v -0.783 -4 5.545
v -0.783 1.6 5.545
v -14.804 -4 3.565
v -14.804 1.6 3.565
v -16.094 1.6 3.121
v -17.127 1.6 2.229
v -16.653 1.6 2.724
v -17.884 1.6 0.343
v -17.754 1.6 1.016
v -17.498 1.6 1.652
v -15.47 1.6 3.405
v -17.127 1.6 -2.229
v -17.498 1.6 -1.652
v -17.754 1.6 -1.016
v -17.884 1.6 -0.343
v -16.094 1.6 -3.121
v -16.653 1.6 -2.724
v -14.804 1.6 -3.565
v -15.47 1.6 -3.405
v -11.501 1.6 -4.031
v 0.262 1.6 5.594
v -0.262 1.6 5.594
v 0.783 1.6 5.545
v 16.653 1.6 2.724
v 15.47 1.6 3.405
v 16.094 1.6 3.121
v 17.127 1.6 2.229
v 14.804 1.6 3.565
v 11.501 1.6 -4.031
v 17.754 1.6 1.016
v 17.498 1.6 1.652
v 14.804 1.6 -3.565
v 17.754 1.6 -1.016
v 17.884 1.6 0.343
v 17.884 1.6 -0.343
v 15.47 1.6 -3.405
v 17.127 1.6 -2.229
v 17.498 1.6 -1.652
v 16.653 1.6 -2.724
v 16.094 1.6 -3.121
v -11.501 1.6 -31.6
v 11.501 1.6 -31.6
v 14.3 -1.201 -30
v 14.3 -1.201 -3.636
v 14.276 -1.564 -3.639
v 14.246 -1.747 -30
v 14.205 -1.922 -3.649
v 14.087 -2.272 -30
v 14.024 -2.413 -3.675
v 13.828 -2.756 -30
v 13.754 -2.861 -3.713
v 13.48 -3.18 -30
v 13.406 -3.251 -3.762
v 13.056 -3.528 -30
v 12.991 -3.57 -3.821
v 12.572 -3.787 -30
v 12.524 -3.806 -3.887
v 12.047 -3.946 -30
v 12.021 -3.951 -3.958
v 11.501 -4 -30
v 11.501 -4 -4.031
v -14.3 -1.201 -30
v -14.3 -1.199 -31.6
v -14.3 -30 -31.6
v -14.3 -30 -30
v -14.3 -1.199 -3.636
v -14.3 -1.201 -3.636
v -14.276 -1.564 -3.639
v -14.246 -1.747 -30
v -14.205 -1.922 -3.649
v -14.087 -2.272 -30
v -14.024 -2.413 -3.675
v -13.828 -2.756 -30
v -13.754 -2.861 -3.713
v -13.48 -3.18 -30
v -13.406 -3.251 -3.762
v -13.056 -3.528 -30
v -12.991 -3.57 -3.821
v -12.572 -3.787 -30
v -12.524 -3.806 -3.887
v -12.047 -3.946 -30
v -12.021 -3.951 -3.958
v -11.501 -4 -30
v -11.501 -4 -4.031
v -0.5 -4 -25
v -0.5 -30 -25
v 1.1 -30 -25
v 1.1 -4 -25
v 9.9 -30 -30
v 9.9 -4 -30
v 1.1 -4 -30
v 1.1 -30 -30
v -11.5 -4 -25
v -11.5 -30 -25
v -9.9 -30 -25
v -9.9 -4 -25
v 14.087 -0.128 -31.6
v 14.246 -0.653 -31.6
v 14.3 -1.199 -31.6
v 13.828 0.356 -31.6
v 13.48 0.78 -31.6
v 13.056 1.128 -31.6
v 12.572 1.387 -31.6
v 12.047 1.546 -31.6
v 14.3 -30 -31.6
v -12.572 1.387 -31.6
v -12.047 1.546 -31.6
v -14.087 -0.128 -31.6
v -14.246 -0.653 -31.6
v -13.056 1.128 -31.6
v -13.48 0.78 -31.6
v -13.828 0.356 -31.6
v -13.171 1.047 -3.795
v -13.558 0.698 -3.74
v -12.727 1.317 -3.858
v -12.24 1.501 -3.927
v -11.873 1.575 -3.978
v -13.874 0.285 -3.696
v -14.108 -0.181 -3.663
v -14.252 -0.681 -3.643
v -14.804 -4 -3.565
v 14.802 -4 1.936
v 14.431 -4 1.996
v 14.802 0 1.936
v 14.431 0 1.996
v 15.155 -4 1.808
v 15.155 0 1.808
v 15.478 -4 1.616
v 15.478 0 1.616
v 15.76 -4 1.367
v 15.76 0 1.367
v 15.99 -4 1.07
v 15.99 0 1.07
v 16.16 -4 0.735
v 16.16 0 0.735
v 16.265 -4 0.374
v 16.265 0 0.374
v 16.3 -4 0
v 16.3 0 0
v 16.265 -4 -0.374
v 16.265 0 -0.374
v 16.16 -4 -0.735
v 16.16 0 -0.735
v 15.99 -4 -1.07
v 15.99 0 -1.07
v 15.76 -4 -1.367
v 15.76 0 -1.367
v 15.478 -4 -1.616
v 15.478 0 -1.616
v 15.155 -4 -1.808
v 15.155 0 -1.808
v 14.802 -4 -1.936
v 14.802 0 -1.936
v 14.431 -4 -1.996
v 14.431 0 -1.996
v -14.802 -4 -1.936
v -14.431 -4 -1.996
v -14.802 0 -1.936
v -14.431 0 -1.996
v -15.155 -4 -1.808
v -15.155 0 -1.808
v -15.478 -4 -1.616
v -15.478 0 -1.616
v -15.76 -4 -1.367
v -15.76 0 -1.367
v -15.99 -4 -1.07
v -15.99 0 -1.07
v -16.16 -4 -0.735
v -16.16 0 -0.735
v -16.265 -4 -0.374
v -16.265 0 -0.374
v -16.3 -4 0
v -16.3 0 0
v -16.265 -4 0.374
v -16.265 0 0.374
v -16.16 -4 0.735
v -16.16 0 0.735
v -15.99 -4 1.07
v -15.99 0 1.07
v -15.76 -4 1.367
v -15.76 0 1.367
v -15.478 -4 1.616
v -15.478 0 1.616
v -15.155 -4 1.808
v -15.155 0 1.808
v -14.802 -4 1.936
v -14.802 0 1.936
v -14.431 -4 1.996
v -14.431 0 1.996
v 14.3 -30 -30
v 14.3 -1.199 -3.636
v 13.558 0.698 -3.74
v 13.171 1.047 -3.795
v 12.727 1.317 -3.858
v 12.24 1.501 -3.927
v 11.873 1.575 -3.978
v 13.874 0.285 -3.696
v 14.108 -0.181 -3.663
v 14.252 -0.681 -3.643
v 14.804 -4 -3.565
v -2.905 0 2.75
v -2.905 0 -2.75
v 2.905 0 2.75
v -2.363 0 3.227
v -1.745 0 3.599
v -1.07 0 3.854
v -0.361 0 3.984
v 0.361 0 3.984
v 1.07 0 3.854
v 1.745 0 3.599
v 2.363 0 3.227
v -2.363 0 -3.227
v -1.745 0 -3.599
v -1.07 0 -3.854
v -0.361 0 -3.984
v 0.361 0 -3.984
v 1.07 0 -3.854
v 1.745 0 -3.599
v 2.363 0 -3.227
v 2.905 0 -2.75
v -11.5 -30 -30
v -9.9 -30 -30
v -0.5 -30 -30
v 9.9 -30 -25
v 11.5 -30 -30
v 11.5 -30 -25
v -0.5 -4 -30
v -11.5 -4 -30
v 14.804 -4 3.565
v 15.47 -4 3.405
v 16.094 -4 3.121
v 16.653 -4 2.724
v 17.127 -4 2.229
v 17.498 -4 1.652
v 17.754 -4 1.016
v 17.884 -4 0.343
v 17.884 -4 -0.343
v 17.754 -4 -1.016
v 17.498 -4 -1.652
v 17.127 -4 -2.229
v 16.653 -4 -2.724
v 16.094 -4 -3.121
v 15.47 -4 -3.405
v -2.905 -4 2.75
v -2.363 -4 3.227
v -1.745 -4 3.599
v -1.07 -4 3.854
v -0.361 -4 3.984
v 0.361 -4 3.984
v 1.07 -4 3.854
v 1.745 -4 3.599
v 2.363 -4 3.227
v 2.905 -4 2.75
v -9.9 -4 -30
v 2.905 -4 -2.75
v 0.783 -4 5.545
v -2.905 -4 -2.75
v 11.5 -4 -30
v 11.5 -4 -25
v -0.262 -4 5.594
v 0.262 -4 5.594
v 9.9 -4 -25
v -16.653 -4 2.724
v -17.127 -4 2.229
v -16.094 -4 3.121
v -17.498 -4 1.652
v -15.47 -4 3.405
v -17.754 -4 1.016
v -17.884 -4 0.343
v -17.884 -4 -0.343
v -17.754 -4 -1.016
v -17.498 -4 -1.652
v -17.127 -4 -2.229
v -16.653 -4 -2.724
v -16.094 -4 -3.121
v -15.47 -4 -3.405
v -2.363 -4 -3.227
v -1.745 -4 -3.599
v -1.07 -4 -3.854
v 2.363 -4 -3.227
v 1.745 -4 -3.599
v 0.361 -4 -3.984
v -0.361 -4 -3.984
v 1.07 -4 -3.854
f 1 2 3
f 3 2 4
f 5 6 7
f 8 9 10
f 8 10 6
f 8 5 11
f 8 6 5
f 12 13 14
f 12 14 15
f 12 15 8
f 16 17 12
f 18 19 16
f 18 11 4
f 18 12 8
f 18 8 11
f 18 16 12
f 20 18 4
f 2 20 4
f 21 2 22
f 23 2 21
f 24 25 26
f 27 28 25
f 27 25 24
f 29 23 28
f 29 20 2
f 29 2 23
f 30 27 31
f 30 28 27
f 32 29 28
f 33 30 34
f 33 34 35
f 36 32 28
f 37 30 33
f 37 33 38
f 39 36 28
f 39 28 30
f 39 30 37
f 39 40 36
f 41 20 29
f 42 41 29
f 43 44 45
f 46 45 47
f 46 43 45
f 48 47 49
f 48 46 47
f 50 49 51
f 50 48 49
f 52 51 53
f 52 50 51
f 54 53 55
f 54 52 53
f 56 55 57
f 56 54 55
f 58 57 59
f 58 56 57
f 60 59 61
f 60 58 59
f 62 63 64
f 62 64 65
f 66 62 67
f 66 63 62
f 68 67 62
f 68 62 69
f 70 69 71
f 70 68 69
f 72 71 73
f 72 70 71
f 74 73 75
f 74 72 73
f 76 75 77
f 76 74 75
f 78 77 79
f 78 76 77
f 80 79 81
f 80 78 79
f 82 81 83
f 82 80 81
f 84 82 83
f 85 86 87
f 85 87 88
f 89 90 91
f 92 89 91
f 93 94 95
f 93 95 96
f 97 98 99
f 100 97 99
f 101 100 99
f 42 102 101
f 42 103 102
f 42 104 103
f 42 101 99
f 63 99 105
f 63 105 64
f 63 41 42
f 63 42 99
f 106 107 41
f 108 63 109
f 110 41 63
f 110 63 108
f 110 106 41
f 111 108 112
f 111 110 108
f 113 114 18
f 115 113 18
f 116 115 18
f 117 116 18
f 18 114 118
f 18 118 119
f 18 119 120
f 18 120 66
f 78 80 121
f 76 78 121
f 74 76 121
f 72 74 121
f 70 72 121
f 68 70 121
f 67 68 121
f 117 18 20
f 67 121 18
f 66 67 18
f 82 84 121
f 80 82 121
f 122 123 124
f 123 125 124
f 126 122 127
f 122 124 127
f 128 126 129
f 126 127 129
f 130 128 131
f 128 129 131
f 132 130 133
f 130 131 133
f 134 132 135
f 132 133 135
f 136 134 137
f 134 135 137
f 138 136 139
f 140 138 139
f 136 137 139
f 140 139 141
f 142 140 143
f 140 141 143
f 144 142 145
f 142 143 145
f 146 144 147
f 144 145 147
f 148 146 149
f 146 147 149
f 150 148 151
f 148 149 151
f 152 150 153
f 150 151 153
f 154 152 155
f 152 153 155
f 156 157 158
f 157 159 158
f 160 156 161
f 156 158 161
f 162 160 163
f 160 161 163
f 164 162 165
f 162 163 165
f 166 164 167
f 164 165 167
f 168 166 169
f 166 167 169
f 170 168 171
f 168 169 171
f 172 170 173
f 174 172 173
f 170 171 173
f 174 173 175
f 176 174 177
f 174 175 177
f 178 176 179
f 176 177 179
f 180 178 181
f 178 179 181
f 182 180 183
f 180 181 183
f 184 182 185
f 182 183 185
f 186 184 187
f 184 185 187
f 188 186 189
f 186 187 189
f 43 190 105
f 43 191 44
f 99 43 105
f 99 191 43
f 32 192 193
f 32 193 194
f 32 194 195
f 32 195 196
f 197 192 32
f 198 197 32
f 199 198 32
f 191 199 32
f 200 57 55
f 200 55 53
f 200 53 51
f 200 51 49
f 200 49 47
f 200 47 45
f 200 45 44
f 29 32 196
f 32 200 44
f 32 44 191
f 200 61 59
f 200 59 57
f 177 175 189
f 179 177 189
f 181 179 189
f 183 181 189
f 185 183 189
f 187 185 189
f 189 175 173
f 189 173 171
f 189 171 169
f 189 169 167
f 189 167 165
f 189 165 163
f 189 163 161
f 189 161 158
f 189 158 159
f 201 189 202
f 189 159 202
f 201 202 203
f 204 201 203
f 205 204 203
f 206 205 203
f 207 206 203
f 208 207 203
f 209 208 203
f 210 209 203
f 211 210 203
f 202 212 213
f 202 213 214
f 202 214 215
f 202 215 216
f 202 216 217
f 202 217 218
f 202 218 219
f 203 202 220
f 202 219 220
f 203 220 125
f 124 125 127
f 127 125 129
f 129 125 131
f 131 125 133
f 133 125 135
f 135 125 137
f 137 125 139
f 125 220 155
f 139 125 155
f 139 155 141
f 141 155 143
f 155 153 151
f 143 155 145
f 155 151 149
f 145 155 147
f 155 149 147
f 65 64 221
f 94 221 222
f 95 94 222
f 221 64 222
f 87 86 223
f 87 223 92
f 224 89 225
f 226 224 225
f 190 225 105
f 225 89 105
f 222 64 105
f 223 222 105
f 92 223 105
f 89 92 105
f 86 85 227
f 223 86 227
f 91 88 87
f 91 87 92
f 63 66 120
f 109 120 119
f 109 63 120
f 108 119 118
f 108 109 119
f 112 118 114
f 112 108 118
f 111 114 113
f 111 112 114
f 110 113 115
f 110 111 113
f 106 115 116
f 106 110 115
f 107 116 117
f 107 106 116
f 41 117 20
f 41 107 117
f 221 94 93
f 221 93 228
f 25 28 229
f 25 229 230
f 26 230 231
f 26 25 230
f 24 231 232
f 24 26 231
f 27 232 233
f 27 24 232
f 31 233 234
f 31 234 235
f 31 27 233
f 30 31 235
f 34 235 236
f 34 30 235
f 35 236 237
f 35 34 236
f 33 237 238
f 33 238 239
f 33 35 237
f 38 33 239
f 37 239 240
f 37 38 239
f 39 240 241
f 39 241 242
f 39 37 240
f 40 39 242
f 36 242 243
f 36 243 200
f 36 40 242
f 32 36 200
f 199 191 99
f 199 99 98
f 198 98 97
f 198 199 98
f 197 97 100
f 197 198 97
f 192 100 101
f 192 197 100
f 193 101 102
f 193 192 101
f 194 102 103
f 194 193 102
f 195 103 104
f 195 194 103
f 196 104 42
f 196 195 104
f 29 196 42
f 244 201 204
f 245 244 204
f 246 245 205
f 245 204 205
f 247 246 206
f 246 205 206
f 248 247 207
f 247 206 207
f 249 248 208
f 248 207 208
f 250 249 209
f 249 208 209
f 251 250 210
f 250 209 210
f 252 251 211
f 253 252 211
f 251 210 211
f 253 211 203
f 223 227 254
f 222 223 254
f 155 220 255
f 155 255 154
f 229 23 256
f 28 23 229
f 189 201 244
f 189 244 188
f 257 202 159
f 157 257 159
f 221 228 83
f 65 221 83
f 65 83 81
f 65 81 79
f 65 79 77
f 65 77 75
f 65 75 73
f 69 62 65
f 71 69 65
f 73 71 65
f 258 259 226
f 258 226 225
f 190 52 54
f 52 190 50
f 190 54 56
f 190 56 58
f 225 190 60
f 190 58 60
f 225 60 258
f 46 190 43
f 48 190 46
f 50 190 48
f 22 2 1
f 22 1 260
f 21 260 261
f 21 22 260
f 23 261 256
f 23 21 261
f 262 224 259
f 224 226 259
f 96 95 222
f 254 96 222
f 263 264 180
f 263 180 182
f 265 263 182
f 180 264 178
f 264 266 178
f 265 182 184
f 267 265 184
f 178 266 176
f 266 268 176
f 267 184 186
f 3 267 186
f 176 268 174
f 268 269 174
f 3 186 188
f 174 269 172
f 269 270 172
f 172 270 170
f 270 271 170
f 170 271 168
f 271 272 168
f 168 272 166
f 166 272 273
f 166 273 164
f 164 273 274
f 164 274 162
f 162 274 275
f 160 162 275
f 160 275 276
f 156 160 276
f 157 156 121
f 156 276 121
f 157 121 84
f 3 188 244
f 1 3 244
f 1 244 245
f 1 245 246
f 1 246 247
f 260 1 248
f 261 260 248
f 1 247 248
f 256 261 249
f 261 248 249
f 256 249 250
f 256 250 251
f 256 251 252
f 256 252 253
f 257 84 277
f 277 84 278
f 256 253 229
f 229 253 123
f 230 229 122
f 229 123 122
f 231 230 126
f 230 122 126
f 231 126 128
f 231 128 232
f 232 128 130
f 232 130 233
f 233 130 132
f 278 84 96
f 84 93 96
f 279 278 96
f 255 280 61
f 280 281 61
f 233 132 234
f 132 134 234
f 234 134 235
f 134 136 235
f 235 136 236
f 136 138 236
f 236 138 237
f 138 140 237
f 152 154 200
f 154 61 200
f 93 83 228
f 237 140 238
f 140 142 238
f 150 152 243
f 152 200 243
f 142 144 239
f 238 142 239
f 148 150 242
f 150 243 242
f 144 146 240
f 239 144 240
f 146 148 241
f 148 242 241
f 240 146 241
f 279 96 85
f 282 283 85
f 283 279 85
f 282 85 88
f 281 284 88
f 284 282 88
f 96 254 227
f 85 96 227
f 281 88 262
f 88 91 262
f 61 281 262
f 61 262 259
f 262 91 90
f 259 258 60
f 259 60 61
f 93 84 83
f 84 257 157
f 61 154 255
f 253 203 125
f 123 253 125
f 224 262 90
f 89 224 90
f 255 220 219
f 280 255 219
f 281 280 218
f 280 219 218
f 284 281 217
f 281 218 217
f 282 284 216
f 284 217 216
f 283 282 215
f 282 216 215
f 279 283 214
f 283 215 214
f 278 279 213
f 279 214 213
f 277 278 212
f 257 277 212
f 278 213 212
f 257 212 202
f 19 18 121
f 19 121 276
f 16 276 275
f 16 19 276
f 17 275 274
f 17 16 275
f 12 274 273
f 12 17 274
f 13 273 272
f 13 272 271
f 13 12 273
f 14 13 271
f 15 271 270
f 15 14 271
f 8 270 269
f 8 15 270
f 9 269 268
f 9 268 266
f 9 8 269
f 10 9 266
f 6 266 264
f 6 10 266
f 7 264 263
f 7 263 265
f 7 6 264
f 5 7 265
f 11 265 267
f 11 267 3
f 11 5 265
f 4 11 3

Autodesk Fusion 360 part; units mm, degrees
sketch "Sketch1" plane through (0, 0, 0) normal (0, 1, 0) x (1, 0, 0)
  line L0 (0, 0) -> (16.3, 0) construction
  line L1 (2.9047, 2.75) -> (2.9047, -2.75) construction
  line L2 (2.9047, 2.75) -> (14.4306, 1.9957)
  line L3 (2.9047, -2.75) -> (14.4306, -1.9957)
  line L4 (0, 4) -> (0, -4) construction
  arc A0 (14.4306, -1.9957) -> (14.4306, 1.9957) centre (14.3, 0) ccw
  line L5 (0.7832, 5.545) -> (14.8035, 3.5646)
  line L6 (0.7832, -5.545) -> (14.8035, -3.5646)
  arc A1 (14.8035, -3.5646) -> (14.8035, 3.5646) centre (14.3, 0) ccw
  line L7 (-2.9047, 2.75) -> (-14.4306, 1.9957)
  line L8 (-0.7832, 5.545) -> (-14.8035, 3.5646)
  line L9 (-2.9047, -2.75) -> (-14.4306, -1.9957)
  line L10 (-0.7832, -5.545) -> (-14.8035, -3.5646)
  arc A2 (-14.4306, 1.9957) -> (-14.4306, -1.9957) centre (-14.3, 0) ccw
  arc A3 (-14.8035, 3.5646) -> (-14.8035, -3.5646) centre (-14.3, 0) ccw
  arc A4 (0.7832, 5.545) -> (-0.7832, 5.545) centre (0, 0) ccw
  arc A5 (-0.7832, -5.545) -> (0.7832, -5.545) centre (0, 0) ccw
  arc A6 (2.9047, 2.75) -> (-2.9047, 2.75) centre (0, 0) ccw
  arc A7 (-2.9047, -2.75) -> (2.9047, -2.75) centre (0, 0) ccw
  line L11 (14.3, 3.6357) -> (14.3, 31.6)
  line L12 (14.3, 30) -> (-14.3, 30)
  line L13 (-14.3, 30) -> (-14.3, 3.6357)
  line L14 (14.3, 31.6) -> (-14.3, 31.6)
  line L15 (-14.3, 31.6) -> (-14.3, 30)
  dimension "d1" = 8
  dimension "d2" = 16.3
  dimension "d3" = 4
  dimension "d5" = 5.5
  dimension "d6" = 1.6
  dimension "d7" = 1.6
  dimension "d8" = 30
  dimension "d16" = 1.6
extrude "Extrude1" add sketch "Sketch1" along normal blind 1.6 contours L2 L3 A0 L7 L9 A2 A6 A7 | L5 L8 A4 L11 L12 L13 | L5 L6 A1 L8 L10 A3 A4 A5 | L11 L12 L14 L15
extrude "Extrude2" add sketch "Sketch1" against normal blind 4 contours L5 L8 A4 L11 L12 L13 | L5 L6 A1 L8 L10 A3 A4 A5
extrude "Extrude3" add sketch "Sketch1" against normal blind 30 contours L11 L12 L14 L15
fillet "Fillet1" radius 2.8 4 edges at (14.3, 1.6, -17.6179) (14.3, -4, -16.8179) (-14.3, 1.6, -17.6179) (-14.3, -4, -16.8179)
ref_plane "WorkPlane1" through (0.3, -15.6, -30.8) normal (1, 0, 0) x (0, 0, -1)
ref_plane "WorkPlane2" through (-11.5, -15.6, -30.8) normal (-1, 0, 0) x (0, 0, 1)
ref_plane "WorkPlane3" through (11.5, -15.6, -30.8) normal (1, 0, 0) x (0, 0, -1)
sketch "Sketch2" plane through (0.3, -15.6, -30.8) normal (1, 0, 0) x (0, 0, -1)
  line L0 (-0.8, 14.4) -> (-0.8, -14.4)
  line L1 (-0.8, -14.4) -> (-5.8, -14.4)
  line L2 (-5.8, -14.4) -> (-5.8, 11.6)
  line L3 (-5.8, 11.6) -> (-0.8, 11.6)
  line L4 (-0.8, 11.6) -> (-0.8, -14.4)
  line L5 (-26.7688, 11.6) -> (-0.8, 11.6)
  dimension "d25" = 5
sketch "Sketch3" plane through (-11.5, -15.6, -30.8) normal (-1, 0, 0) x (0, 0, -1)
  line L0 (-5.8, 14.4) -> (-5.8, -11.6)
  line L1 (-0.8, 14.4) -> (-5.8, 14.4)
  line L2 (-0.8, -11.6) -> (-0.8, 14.4)
  line L3 (-5.8, -11.6) -> (-0.8, -11.6)
sketch "Sketch4" plane through (11.5, -15.6, -30.8) normal (1, 0, 0) x (0, 0, -1)
  line L0 (-5.8, -14.4) -> (-5.8, 11.6)
  line L1 (-0.8, -14.4) -> (-5.8, -14.4)
  line L2 (-0.8, 11.6) -> (-0.8, -14.4)
  line L3 (-5.8, 11.6) -> (-0.8, 11.6)
extrude "Extrude4" add sketch "Sketch2" along normal mid plane 1.6
extrude "Extrude5" add sketch "Sketch4" against normal blind 1.6
extrude "Extrude6" add sketch "Sketch3" against normal blind 1.6
equation "d7 = d6"
